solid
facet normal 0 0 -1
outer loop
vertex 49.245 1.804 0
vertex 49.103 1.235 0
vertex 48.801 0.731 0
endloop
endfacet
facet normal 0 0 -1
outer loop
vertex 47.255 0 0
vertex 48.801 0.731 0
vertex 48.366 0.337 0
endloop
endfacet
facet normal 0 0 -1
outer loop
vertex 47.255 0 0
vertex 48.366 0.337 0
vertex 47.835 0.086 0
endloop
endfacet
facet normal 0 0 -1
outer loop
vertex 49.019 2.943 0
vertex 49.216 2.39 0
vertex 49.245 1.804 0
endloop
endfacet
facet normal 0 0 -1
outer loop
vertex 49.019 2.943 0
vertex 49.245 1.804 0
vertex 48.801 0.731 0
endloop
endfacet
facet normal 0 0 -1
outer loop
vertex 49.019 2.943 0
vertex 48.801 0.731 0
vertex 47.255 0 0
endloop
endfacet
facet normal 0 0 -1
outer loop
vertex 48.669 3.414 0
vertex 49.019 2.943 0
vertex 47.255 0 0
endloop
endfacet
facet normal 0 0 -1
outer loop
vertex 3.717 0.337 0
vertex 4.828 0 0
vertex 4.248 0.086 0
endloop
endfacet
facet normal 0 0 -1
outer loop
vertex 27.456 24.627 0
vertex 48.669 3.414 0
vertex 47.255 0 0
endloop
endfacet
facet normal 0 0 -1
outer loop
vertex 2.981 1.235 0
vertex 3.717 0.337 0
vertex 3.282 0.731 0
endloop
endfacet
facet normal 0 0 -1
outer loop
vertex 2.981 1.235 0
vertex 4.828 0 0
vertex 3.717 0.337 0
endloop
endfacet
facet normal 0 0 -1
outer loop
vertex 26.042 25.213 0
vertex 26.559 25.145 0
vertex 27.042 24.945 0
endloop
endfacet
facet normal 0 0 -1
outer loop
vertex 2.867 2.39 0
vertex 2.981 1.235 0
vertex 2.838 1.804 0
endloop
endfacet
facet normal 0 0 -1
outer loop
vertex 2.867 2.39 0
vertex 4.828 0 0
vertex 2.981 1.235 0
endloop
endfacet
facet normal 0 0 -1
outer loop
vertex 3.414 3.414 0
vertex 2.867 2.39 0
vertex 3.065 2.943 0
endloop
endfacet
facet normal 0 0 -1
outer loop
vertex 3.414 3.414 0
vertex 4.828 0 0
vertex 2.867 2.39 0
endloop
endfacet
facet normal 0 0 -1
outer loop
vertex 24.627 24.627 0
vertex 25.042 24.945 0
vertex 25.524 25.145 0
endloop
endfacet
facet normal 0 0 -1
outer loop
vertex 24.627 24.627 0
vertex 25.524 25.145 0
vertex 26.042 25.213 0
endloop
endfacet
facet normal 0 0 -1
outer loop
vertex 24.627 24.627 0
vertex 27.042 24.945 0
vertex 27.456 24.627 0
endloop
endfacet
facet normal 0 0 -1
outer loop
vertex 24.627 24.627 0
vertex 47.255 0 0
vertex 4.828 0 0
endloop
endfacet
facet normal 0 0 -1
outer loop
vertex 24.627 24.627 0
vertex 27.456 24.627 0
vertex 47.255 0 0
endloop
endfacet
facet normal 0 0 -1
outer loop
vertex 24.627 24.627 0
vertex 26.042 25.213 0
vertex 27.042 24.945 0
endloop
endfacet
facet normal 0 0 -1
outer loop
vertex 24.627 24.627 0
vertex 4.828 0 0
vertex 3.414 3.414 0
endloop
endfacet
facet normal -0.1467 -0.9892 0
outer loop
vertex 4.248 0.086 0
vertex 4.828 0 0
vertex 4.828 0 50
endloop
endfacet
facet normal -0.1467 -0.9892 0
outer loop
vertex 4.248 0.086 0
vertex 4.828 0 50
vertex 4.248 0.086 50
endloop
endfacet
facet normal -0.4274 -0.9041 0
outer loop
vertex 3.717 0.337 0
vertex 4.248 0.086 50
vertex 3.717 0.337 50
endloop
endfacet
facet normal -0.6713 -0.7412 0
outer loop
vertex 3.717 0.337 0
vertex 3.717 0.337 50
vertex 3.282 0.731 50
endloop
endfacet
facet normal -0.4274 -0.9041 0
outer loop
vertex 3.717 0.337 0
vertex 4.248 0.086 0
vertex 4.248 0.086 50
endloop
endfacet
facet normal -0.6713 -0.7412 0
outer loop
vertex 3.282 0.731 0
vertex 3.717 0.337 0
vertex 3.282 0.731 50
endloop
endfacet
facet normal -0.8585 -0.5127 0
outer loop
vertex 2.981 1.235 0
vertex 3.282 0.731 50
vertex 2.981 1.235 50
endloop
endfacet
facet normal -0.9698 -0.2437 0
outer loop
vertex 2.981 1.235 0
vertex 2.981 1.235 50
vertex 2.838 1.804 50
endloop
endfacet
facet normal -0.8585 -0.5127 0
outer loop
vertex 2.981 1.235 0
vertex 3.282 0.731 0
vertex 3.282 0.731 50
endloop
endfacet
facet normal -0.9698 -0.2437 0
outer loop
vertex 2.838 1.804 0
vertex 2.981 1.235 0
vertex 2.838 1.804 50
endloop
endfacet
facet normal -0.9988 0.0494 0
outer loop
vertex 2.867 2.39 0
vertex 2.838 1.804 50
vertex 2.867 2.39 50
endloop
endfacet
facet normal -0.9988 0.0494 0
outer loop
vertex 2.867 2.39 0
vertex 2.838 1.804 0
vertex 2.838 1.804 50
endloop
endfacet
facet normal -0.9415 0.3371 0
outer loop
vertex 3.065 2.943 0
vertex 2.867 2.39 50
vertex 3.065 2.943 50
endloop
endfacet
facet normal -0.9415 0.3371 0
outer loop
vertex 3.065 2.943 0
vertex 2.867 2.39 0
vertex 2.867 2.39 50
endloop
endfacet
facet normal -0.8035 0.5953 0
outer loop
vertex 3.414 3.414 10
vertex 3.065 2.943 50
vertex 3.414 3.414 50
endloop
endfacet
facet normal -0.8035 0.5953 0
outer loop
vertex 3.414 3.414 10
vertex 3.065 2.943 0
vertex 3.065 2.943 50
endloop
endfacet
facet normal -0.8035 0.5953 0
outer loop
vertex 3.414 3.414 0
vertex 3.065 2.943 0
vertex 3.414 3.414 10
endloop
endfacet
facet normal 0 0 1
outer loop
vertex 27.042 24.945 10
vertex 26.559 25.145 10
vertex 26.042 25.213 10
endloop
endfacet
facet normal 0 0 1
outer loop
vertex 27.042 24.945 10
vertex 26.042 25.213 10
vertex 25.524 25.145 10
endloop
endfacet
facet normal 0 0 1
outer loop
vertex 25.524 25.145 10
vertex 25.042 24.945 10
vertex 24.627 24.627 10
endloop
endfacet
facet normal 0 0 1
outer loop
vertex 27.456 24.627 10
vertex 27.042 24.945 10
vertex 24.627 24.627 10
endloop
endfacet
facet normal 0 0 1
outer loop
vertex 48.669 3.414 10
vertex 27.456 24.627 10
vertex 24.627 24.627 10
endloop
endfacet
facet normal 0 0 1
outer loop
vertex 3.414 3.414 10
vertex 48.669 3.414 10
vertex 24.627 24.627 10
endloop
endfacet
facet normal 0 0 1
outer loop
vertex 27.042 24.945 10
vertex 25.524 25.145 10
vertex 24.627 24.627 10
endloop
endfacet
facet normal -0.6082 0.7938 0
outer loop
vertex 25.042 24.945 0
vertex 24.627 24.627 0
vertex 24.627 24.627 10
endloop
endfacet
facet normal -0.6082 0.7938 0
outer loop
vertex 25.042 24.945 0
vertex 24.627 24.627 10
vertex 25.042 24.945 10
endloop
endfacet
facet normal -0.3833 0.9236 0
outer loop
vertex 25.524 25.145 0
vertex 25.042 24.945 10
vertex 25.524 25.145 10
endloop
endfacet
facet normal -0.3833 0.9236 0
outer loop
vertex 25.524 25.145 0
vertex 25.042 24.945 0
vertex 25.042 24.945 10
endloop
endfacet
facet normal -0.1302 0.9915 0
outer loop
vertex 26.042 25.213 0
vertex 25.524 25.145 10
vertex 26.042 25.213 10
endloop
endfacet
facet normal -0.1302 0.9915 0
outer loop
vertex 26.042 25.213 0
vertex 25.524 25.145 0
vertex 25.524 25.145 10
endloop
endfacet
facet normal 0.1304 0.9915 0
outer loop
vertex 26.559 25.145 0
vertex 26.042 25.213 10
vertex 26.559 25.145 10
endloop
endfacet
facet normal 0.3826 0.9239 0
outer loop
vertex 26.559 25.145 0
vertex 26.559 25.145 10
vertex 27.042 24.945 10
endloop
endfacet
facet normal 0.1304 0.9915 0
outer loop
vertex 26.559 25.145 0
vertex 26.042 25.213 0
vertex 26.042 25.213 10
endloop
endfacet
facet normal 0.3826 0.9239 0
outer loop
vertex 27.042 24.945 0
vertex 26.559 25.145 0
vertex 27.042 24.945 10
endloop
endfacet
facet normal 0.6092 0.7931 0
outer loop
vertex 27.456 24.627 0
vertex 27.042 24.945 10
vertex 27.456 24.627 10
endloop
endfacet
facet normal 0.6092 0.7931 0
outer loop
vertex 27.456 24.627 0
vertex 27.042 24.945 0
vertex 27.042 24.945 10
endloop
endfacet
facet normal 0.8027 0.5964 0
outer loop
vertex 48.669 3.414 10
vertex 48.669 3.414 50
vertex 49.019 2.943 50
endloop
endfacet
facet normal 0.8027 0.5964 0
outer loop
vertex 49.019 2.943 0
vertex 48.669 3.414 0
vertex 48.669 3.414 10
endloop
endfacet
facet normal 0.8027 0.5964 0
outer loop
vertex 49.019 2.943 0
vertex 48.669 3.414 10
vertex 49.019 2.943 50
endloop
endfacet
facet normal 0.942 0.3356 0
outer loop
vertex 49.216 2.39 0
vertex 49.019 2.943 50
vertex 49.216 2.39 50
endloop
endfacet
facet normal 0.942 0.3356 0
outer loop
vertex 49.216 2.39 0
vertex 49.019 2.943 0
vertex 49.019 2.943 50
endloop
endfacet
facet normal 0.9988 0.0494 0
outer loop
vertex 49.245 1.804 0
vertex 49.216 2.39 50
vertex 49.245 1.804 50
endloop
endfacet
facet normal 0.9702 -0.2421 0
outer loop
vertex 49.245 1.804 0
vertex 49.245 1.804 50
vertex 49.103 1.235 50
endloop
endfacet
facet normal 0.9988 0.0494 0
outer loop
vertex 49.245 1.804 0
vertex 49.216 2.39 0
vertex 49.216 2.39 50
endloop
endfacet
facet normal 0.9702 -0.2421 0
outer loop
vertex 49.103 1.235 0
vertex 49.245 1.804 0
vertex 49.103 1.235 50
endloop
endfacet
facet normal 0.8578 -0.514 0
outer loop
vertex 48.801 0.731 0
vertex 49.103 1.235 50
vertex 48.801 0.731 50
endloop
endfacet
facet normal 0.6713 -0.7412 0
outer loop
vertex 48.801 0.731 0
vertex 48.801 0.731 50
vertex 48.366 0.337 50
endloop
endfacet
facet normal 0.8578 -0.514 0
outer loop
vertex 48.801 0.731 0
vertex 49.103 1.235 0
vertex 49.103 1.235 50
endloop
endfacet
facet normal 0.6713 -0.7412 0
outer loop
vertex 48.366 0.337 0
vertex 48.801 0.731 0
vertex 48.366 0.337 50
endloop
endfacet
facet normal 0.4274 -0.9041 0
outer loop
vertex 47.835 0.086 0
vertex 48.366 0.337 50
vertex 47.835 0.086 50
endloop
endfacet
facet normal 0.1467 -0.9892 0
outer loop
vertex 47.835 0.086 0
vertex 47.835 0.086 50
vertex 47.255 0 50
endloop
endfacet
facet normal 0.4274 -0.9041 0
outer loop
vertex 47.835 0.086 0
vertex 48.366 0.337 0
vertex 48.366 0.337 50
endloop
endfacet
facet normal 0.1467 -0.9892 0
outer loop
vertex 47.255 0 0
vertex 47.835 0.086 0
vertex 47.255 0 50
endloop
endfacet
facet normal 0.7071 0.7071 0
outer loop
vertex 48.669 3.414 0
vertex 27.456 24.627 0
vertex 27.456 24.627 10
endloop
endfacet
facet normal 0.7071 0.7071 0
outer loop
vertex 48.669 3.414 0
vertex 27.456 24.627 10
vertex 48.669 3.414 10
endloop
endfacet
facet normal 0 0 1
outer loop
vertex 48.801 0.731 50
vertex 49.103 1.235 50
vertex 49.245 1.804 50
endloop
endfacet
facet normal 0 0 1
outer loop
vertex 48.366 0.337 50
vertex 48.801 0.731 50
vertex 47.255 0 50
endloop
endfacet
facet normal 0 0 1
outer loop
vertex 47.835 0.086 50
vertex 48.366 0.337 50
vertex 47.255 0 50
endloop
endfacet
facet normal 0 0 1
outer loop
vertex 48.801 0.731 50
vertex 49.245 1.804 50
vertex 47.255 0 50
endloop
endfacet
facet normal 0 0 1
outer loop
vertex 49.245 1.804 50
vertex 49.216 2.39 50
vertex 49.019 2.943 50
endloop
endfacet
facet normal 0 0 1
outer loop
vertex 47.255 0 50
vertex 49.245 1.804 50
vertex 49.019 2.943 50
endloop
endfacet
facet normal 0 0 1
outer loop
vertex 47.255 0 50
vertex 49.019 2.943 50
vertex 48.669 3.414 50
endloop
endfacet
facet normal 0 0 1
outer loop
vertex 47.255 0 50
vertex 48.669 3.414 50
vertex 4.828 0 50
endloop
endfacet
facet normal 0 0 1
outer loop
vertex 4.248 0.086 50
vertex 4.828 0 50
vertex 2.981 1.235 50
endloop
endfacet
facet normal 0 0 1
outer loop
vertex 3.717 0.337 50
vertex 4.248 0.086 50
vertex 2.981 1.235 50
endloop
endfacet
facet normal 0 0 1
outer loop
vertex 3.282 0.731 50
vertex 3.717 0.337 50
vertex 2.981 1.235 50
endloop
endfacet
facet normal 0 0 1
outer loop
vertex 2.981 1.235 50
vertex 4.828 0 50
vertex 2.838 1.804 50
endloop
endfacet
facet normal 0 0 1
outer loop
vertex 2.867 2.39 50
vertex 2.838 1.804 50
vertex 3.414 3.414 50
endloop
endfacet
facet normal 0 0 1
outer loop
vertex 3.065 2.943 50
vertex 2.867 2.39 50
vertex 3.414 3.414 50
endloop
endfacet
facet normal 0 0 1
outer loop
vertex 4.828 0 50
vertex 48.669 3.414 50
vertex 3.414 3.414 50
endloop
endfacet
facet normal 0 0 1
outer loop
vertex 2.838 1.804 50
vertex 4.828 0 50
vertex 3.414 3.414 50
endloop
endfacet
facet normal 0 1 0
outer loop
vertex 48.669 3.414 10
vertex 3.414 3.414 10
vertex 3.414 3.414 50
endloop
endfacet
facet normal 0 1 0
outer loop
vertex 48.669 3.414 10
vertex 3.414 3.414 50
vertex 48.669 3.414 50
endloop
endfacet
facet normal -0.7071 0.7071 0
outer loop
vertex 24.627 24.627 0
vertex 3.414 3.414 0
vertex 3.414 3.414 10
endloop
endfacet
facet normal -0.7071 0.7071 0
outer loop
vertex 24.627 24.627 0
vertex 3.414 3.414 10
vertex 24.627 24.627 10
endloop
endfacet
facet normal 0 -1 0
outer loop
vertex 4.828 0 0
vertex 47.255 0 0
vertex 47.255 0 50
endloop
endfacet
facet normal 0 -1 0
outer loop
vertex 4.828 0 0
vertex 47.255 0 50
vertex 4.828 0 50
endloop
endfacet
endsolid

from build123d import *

# Parameters (mm, degrees)
BOSS_EXTRU_1_DEPTH = 50
BOSS_EXTRU_2_DEPTH = 10


with BuildPart() as part:
    # Esquisse1 → Boss.-Extru.1 (new body)
    with BuildSketch(Plane.XY):
        with BuildLine():
            Line((48.669047558, 3.414213562), (3.414213562, 3.414213562))
            ThreePointArc((3.414213562, 3.414213562), (2.98066806, 1.234633135), (4.828427125, 0))
            Line((4.828427125, 0), (47.254833996, 0))
            ThreePointArc((47.254833996, 0), (49.102593061, 1.234633135), (48.669047558, 3.414213562))
        make_face()
    extrude(amount=BOSS_EXTRU_1_DEPTH)

    # Esquisse1<3> → Boss.-Extru.2 (add)
    with BuildSketch(Plane.XY):
        with BuildLine():
            Line((24.627416998, 24.627416998), (3.414213562, 3.414213562))
            Line((3.414213562, 3.414213562), (48.669047558, 3.414213562))
            Line((48.669047558, 3.414213562), (27.455844123, 24.627416998))
            ThreePointArc((27.455844123, 24.627416998), (26.04163056, 25.213203436), (24.627416998, 24.627416998))
        make_face()
    extrude(amount=BOSS_EXTRU_2_DEPTH)


solid = part.part
